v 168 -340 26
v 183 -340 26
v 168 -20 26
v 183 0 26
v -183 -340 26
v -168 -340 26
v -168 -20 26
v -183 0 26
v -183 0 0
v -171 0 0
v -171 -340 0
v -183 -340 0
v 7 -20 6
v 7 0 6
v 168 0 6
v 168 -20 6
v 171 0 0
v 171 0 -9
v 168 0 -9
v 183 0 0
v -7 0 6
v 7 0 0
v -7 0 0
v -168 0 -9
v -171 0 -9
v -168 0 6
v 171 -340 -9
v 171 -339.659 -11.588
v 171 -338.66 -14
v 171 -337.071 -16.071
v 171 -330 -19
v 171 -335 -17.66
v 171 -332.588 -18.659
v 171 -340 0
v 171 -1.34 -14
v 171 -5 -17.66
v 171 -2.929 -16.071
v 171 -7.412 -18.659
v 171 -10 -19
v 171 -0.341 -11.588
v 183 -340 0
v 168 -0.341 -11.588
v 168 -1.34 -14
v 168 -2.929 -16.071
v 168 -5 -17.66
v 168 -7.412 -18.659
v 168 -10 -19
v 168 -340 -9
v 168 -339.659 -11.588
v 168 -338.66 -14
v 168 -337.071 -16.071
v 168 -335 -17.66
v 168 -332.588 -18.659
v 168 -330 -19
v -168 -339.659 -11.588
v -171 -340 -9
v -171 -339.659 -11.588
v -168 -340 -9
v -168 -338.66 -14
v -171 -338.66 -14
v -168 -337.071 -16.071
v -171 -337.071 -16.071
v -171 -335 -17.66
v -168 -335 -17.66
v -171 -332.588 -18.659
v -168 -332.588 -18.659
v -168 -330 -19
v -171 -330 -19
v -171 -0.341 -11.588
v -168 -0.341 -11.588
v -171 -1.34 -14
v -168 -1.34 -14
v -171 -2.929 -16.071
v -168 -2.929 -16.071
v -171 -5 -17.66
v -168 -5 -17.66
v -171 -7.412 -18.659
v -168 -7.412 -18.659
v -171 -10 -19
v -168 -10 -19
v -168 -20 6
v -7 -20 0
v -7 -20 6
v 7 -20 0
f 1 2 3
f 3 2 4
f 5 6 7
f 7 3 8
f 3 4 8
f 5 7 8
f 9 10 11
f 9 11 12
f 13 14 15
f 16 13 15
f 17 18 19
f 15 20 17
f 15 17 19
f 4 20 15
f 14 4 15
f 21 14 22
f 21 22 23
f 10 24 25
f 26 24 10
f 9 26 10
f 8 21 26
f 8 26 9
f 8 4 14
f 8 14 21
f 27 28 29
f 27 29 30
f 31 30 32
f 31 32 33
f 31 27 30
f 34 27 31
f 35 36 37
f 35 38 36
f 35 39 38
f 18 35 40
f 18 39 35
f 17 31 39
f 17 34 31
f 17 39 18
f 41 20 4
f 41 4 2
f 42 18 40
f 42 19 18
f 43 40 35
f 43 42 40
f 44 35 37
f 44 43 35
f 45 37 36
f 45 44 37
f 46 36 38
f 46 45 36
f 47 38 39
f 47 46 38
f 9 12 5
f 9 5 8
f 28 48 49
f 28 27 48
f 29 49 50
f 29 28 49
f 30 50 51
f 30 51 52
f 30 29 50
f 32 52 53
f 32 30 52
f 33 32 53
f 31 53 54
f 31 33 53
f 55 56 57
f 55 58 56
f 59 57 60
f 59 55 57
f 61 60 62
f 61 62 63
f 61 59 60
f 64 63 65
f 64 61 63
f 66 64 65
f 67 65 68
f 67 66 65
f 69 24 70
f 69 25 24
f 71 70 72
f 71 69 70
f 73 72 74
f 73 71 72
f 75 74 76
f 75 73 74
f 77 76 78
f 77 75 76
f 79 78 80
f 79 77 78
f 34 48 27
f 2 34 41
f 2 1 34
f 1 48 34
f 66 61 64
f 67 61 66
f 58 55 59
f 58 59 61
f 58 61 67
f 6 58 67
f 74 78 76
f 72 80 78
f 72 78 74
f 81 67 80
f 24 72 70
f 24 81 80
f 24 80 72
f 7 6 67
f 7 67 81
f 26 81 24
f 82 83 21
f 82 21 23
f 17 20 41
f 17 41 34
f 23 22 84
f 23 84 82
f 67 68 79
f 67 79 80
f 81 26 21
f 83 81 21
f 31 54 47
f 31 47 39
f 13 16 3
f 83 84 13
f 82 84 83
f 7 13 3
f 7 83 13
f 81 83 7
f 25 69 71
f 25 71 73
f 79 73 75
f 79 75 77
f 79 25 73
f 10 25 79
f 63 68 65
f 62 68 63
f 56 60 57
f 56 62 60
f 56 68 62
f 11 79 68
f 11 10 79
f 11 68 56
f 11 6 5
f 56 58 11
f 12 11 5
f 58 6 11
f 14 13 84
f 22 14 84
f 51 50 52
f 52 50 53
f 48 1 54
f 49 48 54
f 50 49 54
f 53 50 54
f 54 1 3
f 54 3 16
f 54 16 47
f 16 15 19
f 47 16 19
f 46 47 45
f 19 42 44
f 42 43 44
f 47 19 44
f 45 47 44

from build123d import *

# Parameters (mm, degrees)
EXTRUDE_1_DEPTH     = 26
SKETCH_1_4_W        = 3
SKETCH_1_4_H        = 340
EXTRUDE_2_DEPTH     = 19
FILLET_1_R          = 10
SKETCH_5_W          = 161
SKETCH_5_H          = 6
CUT_EXTRUDE_1_DEPTH = 52


with BuildPart() as part:
    # 스케치1 → 보스-돌출1 (new body)
    with BuildSketch(Plane.XY):
        Polygon((-168, 0), (168, 0), (183, 0), (183, -340), (168, -340), (168, -20), (-168, -20), (-168, -340), (-183, -340), (-183, 0), align=None)
    extrude(amount=EXTRUDE_1_DEPTH)

    # 스케치1<4> → 보스-돌출2 (add)
    with BuildSketch(Plane.XY):
        with Locations((-169.5, -170)):
            Rectangle(SKETCH_1_4_W, SKETCH_1_4_H)
        with Locations((169.5, -170)):
            Rectangle(SKETCH_1_4_W, SKETCH_1_4_H)
    extrude(amount=-EXTRUDE_2_DEPTH)

    # 필렛1
    fillet_1_edges = [part.edges().sort_by_distance(p)[0] for p in [
        (-169.5, 0, -19),
        (169.5, 0, -19),
        (169.5, -340, -19),
        (-169.5, -340, -19),
    ]]
    fillet(fillet_1_edges, radius=FILLET_1_R)

    # 스케치5 → 컷-돌출1 (cut)
    with BuildSketch(Plane(origin=(0, 0, 0), x_dir=(1, 0, 0), z_dir=(0, 1, 0))):
        with Locations((-87.5, -3)):
            Rectangle(SKETCH_5_W, SKETCH_5_H)
        with Locations((87.5, -3)):
            Rectangle(SKETCH_5_W, SKETCH_5_H)
    extrude(amount=-CUT_EXTRUDE_1_DEPTH, mode=Mode.SUBTRACT)


solid = part.part
